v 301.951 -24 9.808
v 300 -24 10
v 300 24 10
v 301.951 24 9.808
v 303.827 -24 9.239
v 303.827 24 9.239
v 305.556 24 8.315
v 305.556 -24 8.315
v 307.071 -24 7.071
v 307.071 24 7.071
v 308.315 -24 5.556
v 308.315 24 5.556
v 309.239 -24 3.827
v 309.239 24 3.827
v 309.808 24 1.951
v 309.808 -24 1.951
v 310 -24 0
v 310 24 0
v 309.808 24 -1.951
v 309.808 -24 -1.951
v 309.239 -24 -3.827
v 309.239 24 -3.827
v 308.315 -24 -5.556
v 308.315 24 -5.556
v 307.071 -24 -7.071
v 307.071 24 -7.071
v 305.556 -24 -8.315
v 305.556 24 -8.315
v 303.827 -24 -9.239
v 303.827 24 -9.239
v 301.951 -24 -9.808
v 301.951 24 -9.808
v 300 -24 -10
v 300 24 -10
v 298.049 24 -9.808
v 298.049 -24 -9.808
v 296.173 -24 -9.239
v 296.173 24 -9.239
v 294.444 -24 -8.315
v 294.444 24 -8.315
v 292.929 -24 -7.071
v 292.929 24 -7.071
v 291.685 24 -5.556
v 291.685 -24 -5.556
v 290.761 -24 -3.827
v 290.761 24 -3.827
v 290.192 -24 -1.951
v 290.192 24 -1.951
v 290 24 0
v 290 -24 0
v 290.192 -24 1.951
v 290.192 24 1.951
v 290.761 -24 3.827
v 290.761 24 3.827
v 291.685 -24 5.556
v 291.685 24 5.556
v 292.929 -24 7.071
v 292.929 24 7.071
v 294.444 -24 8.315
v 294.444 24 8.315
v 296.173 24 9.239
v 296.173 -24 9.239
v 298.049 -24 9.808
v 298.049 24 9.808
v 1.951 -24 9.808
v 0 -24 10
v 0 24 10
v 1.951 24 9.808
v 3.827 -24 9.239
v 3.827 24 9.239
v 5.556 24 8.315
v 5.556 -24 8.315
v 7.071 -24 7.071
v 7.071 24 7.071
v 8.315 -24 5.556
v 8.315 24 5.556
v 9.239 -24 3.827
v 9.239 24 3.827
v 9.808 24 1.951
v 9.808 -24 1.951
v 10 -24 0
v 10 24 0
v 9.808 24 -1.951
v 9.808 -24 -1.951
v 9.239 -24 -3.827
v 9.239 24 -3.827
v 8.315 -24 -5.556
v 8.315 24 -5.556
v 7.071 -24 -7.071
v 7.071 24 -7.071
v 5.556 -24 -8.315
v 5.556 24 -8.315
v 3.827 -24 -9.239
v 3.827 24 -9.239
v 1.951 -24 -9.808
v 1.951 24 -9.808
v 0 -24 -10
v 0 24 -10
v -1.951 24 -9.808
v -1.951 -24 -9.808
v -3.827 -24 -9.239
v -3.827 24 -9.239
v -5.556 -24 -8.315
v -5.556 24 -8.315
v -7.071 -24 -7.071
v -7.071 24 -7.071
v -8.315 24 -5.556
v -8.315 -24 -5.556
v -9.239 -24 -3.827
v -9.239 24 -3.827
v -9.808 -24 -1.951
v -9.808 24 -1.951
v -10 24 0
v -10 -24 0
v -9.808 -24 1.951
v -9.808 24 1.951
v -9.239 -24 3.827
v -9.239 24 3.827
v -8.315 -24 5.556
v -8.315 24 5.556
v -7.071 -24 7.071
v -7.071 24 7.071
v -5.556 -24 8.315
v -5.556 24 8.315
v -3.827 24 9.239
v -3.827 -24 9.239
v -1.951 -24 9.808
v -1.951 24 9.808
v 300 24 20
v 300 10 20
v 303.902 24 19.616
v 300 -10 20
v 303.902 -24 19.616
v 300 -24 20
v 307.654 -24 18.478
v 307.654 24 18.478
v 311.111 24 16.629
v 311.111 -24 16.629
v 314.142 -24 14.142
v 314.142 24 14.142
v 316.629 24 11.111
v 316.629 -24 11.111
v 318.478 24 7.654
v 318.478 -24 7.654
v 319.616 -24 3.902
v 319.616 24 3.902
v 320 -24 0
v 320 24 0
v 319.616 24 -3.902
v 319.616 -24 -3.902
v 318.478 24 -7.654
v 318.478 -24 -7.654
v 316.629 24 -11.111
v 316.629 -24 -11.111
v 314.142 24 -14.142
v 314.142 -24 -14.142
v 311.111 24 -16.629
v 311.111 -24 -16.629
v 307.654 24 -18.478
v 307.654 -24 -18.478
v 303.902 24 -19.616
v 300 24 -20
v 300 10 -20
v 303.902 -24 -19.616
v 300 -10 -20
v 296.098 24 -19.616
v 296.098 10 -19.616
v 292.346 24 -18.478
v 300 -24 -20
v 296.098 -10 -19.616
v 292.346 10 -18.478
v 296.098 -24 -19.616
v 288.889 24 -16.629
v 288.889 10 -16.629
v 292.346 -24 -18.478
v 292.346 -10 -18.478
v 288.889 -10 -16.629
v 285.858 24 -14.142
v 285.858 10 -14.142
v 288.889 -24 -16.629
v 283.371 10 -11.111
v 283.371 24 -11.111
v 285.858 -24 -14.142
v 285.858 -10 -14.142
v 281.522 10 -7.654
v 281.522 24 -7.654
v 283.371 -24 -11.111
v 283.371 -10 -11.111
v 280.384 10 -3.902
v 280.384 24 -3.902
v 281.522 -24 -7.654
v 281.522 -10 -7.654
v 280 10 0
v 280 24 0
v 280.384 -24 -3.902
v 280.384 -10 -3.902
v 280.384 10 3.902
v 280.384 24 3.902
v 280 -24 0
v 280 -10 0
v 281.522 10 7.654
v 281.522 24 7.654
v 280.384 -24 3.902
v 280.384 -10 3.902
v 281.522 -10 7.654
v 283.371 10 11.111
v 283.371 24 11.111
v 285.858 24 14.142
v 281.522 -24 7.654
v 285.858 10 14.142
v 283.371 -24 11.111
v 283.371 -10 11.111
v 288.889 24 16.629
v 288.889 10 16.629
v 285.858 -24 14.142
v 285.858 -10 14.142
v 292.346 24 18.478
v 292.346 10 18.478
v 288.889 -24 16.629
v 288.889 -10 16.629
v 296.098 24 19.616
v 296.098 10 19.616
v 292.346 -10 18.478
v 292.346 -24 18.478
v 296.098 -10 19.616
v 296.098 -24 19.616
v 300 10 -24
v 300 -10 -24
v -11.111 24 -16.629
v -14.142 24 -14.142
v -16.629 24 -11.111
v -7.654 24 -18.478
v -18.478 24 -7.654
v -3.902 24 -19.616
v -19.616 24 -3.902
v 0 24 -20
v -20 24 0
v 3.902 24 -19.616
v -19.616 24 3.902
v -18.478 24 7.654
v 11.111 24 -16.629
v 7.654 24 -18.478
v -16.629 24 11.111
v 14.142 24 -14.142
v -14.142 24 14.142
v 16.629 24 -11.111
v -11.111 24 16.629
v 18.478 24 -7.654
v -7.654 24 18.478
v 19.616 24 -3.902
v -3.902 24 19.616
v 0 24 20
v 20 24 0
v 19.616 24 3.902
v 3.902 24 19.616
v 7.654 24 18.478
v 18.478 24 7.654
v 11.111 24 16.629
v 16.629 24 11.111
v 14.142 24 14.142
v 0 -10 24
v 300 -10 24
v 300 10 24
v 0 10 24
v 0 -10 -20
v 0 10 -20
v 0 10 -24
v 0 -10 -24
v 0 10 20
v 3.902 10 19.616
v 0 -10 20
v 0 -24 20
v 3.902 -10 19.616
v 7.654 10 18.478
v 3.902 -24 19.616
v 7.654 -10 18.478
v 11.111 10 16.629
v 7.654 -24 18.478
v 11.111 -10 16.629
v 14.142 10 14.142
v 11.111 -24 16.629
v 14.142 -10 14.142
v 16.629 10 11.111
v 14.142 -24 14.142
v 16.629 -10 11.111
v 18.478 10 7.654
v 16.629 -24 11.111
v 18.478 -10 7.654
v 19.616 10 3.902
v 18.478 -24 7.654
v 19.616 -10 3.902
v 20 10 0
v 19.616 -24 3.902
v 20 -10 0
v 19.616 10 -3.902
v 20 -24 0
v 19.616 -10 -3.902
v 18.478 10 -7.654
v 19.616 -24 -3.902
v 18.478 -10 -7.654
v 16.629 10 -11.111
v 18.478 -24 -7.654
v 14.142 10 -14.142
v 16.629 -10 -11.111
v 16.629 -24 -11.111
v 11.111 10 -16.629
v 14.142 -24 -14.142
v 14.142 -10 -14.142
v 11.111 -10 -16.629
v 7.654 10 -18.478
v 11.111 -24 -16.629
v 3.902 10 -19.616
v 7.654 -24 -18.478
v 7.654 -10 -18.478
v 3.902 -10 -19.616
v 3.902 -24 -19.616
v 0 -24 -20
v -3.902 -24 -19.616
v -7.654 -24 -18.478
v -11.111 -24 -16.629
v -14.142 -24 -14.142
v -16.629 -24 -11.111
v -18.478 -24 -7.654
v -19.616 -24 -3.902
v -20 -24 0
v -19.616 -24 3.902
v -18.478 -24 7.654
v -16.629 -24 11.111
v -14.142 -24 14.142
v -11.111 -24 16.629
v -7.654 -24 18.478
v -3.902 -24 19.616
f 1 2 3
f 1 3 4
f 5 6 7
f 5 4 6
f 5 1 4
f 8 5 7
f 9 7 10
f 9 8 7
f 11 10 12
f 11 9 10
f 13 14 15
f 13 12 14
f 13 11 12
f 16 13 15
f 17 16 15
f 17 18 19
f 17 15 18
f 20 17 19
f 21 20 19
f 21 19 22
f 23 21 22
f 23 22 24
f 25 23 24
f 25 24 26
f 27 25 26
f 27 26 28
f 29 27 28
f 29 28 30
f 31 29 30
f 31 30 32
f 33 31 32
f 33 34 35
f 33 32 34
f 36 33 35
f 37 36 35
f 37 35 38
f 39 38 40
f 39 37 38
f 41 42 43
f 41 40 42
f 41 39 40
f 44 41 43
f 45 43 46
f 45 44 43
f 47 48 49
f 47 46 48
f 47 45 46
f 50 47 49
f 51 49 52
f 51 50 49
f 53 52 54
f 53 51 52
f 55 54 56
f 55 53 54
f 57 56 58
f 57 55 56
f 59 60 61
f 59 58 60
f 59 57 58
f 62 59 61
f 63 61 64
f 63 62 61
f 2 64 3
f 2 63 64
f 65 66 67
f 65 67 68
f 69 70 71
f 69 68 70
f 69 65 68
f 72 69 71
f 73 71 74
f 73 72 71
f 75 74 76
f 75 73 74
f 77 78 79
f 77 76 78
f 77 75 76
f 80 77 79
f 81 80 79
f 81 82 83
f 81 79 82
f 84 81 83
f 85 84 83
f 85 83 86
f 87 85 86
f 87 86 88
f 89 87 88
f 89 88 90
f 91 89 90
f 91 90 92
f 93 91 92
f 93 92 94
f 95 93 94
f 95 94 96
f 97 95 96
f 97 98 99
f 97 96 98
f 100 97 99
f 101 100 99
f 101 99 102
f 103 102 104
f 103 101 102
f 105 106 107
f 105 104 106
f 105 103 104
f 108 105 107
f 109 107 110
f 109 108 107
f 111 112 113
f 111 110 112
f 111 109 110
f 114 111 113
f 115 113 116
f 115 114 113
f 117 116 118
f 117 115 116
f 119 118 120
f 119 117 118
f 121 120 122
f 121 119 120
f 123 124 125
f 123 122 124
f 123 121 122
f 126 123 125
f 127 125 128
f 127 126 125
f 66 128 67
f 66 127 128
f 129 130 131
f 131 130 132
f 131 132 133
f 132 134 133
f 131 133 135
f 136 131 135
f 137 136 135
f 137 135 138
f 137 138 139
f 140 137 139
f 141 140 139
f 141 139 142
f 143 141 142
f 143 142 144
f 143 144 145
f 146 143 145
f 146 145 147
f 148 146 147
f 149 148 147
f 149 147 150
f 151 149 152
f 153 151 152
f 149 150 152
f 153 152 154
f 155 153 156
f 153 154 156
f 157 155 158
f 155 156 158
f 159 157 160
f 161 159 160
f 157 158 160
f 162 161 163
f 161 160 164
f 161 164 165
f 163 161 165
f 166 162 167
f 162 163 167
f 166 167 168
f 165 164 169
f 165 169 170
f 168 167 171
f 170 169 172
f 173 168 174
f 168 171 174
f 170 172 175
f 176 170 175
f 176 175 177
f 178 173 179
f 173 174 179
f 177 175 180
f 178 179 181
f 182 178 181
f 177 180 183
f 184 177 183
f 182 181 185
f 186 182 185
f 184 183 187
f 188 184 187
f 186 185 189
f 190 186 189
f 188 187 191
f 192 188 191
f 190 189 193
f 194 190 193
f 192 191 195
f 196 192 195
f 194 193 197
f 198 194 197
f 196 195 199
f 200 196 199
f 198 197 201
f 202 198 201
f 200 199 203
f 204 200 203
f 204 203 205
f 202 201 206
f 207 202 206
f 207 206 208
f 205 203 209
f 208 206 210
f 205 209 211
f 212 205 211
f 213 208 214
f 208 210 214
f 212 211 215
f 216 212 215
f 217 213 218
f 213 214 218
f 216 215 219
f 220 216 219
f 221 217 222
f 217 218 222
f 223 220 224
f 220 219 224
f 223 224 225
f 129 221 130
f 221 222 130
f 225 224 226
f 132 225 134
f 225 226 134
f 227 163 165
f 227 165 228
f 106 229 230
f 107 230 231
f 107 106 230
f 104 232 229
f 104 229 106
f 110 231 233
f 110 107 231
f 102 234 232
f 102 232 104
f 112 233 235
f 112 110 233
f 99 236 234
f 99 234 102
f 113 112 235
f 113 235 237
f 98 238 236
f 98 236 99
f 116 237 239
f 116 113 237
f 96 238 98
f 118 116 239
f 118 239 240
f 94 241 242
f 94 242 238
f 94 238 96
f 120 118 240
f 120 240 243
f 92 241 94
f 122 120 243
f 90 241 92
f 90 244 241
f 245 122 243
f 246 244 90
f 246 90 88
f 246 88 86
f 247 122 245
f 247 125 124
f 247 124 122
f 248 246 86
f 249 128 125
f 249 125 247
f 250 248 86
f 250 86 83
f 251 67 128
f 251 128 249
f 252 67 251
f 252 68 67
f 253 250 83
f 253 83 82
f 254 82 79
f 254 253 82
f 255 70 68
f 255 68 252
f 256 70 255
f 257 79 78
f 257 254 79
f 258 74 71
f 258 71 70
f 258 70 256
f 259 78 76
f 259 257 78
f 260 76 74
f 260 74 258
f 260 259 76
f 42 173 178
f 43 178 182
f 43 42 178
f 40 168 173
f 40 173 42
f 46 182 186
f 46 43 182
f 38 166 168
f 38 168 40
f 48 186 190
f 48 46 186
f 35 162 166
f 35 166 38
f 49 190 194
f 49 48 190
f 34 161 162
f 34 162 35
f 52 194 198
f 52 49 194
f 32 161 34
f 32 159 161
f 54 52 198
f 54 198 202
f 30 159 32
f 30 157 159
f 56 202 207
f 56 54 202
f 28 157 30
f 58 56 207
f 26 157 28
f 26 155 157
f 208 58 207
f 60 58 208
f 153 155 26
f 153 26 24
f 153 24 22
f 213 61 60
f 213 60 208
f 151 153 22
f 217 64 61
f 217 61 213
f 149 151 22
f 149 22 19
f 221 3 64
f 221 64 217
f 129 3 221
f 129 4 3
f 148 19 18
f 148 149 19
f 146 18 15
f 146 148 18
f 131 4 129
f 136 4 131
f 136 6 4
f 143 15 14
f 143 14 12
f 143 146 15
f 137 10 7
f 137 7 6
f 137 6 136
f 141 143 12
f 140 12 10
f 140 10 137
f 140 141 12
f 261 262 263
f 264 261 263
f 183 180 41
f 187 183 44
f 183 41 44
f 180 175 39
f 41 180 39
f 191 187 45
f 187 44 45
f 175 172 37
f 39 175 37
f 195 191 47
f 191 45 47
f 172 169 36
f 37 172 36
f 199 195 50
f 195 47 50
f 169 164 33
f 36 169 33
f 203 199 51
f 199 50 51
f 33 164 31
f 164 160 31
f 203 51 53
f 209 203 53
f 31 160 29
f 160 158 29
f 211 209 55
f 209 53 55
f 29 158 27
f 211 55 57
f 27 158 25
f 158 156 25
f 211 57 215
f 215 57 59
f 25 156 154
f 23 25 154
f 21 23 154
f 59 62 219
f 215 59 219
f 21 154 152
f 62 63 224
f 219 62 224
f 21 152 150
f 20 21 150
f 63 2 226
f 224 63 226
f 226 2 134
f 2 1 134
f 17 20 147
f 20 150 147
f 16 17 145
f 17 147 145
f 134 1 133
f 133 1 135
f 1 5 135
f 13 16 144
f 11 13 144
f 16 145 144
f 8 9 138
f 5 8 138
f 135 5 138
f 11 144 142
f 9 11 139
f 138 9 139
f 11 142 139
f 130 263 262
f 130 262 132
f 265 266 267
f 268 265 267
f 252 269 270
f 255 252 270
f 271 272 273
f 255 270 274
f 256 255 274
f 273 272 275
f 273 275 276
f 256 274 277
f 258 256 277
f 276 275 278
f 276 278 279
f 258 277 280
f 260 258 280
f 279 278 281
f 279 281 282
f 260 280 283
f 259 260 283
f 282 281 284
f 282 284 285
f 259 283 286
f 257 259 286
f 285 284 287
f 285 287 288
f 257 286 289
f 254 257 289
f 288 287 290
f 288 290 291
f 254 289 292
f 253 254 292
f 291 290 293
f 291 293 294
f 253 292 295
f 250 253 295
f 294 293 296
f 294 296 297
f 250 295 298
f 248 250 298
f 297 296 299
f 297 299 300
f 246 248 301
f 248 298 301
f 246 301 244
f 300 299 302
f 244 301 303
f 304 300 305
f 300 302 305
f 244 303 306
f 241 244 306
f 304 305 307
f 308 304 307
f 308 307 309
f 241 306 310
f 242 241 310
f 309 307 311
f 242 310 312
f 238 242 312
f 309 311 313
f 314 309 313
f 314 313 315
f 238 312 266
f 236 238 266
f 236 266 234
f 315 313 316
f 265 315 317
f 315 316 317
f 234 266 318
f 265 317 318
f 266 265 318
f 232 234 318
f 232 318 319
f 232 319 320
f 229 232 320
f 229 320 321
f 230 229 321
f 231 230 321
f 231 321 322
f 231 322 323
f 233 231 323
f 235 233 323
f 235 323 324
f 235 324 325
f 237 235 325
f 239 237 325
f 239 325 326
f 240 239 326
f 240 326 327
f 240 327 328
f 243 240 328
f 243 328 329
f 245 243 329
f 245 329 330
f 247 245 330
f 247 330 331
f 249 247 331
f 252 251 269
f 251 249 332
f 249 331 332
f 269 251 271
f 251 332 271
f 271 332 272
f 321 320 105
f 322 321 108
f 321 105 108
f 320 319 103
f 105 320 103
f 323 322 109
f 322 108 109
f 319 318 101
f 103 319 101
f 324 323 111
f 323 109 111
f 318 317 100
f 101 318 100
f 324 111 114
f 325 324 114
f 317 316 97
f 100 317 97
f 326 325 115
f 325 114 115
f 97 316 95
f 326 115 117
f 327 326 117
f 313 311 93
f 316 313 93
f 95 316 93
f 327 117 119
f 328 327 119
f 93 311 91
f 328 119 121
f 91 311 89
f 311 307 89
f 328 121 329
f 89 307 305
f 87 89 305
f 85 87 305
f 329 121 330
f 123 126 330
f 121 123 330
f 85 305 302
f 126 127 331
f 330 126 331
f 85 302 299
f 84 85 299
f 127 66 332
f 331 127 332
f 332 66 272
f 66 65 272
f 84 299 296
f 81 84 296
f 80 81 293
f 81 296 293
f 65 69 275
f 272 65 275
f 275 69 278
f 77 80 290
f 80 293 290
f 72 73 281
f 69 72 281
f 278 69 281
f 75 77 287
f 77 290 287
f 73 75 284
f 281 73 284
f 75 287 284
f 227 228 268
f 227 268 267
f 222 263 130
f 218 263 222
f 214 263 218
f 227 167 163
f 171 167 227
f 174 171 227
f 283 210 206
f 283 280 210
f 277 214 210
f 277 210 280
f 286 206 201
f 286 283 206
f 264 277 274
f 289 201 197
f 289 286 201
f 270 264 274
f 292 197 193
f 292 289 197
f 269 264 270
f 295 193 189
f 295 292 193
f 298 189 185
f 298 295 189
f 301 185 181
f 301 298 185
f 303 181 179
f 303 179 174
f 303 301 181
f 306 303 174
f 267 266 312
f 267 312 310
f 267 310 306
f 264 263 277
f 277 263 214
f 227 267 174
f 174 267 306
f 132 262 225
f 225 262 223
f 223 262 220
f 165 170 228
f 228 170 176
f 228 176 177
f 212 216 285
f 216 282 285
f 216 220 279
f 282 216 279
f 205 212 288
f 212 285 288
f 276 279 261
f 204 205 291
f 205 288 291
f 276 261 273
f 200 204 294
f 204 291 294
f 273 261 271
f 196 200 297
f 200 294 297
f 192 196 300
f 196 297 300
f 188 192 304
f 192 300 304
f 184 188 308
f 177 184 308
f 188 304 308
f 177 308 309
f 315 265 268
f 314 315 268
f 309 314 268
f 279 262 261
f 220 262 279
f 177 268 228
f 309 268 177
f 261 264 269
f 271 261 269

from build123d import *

# Parameters (mm, degrees)
SKETCH1_W                = 48
SKETCH1_H                = 20
BOSS_EXTRUDE1_DEPTH      = 300
BOSS_EXTRUDE2_DEPTH      = 24
BOSS_EXTRUDE2_DEPTH_BACK = 24
SKETCH2_R                = 20
BOSS_EXTRUDE3_DEPTH      = 24
BOSS_EXTRUDE3_DEPTH_BACK = 24
SKETCH3_R                = 20
CUT_EXTRUDE1_DEPTH       = 50
CUT_EXTRUDE1_DEPTH_BACK  = 50
SKETCH4_R                = 10
CUT_EXTRUDE2_DEPTH       = 50
CUT_EXTRUDE2_DEPTH_BACK  = 50
SKETCH5_R                = 10


with BuildPart() as part:
    # Sketch1 → Boss-Extrude1 (new body)
    with BuildSketch(Plane(origin=(0, 0, 0), x_dir=(0, 0, -1), z_dir=(1, 0, 0))):
        Rectangle(SKETCH1_W, SKETCH1_H)
    extrude(amount=BOSS_EXTRUDE1_DEPTH)

    # Sketch2 → Boss-Extrude2 (add, two sides: drawn at the far end of the back side and taken through both)
    with BuildSketch(Plane(origin=(0, 0, 0), x_dir=(1, 0, 0), z_dir=(0, 1, 0)).offset(-BOSS_EXTRUDE2_DEPTH_BACK)):
        Circle(SKETCH2_R)
    extrude(amount=BOSS_EXTRUDE2_DEPTH + BOSS_EXTRUDE2_DEPTH_BACK)

    # Sketch3 → Boss-Extrude3 (add, two sides: drawn at the far end of the back side and taken through both)
    with BuildSketch(Plane(origin=(0, 0, 0), x_dir=(1, 0, 0), z_dir=(0, 1, 0)).offset(-BOSS_EXTRUDE3_DEPTH_BACK)):
        with Locations((300, 0)):
            Circle(SKETCH3_R)
    extrude(amount=BOSS_EXTRUDE3_DEPTH + BOSS_EXTRUDE3_DEPTH_BACK)

    # Sketch4 → Cut-Extrude1 (cut, two sides: drawn at the far end of the back side and taken through both)
    with BuildSketch(Plane(origin=(0, 0, 0), x_dir=(1, 0, 0), z_dir=(0, 1, 0)).offset(-CUT_EXTRUDE1_DEPTH_BACK)):
        Circle(SKETCH4_R)
    extrude(amount=CUT_EXTRUDE1_DEPTH + CUT_EXTRUDE1_DEPTH_BACK, mode=Mode.SUBTRACT)

    # Sketch5 → Cut-Extrude2 (cut, two sides: drawn at the far end of the back side and taken through both)
    with BuildSketch(Plane(origin=(0, 0, 0), x_dir=(1, 0, 0), z_dir=(0, 1, 0)).offset(-CUT_EXTRUDE2_DEPTH_BACK)):
        with Locations((300, 0)):
            Circle(SKETCH5_R)
    extrude(amount=CUT_EXTRUDE2_DEPTH + CUT_EXTRUDE2_DEPTH_BACK, mode=Mode.SUBTRACT)


solid = part.part
